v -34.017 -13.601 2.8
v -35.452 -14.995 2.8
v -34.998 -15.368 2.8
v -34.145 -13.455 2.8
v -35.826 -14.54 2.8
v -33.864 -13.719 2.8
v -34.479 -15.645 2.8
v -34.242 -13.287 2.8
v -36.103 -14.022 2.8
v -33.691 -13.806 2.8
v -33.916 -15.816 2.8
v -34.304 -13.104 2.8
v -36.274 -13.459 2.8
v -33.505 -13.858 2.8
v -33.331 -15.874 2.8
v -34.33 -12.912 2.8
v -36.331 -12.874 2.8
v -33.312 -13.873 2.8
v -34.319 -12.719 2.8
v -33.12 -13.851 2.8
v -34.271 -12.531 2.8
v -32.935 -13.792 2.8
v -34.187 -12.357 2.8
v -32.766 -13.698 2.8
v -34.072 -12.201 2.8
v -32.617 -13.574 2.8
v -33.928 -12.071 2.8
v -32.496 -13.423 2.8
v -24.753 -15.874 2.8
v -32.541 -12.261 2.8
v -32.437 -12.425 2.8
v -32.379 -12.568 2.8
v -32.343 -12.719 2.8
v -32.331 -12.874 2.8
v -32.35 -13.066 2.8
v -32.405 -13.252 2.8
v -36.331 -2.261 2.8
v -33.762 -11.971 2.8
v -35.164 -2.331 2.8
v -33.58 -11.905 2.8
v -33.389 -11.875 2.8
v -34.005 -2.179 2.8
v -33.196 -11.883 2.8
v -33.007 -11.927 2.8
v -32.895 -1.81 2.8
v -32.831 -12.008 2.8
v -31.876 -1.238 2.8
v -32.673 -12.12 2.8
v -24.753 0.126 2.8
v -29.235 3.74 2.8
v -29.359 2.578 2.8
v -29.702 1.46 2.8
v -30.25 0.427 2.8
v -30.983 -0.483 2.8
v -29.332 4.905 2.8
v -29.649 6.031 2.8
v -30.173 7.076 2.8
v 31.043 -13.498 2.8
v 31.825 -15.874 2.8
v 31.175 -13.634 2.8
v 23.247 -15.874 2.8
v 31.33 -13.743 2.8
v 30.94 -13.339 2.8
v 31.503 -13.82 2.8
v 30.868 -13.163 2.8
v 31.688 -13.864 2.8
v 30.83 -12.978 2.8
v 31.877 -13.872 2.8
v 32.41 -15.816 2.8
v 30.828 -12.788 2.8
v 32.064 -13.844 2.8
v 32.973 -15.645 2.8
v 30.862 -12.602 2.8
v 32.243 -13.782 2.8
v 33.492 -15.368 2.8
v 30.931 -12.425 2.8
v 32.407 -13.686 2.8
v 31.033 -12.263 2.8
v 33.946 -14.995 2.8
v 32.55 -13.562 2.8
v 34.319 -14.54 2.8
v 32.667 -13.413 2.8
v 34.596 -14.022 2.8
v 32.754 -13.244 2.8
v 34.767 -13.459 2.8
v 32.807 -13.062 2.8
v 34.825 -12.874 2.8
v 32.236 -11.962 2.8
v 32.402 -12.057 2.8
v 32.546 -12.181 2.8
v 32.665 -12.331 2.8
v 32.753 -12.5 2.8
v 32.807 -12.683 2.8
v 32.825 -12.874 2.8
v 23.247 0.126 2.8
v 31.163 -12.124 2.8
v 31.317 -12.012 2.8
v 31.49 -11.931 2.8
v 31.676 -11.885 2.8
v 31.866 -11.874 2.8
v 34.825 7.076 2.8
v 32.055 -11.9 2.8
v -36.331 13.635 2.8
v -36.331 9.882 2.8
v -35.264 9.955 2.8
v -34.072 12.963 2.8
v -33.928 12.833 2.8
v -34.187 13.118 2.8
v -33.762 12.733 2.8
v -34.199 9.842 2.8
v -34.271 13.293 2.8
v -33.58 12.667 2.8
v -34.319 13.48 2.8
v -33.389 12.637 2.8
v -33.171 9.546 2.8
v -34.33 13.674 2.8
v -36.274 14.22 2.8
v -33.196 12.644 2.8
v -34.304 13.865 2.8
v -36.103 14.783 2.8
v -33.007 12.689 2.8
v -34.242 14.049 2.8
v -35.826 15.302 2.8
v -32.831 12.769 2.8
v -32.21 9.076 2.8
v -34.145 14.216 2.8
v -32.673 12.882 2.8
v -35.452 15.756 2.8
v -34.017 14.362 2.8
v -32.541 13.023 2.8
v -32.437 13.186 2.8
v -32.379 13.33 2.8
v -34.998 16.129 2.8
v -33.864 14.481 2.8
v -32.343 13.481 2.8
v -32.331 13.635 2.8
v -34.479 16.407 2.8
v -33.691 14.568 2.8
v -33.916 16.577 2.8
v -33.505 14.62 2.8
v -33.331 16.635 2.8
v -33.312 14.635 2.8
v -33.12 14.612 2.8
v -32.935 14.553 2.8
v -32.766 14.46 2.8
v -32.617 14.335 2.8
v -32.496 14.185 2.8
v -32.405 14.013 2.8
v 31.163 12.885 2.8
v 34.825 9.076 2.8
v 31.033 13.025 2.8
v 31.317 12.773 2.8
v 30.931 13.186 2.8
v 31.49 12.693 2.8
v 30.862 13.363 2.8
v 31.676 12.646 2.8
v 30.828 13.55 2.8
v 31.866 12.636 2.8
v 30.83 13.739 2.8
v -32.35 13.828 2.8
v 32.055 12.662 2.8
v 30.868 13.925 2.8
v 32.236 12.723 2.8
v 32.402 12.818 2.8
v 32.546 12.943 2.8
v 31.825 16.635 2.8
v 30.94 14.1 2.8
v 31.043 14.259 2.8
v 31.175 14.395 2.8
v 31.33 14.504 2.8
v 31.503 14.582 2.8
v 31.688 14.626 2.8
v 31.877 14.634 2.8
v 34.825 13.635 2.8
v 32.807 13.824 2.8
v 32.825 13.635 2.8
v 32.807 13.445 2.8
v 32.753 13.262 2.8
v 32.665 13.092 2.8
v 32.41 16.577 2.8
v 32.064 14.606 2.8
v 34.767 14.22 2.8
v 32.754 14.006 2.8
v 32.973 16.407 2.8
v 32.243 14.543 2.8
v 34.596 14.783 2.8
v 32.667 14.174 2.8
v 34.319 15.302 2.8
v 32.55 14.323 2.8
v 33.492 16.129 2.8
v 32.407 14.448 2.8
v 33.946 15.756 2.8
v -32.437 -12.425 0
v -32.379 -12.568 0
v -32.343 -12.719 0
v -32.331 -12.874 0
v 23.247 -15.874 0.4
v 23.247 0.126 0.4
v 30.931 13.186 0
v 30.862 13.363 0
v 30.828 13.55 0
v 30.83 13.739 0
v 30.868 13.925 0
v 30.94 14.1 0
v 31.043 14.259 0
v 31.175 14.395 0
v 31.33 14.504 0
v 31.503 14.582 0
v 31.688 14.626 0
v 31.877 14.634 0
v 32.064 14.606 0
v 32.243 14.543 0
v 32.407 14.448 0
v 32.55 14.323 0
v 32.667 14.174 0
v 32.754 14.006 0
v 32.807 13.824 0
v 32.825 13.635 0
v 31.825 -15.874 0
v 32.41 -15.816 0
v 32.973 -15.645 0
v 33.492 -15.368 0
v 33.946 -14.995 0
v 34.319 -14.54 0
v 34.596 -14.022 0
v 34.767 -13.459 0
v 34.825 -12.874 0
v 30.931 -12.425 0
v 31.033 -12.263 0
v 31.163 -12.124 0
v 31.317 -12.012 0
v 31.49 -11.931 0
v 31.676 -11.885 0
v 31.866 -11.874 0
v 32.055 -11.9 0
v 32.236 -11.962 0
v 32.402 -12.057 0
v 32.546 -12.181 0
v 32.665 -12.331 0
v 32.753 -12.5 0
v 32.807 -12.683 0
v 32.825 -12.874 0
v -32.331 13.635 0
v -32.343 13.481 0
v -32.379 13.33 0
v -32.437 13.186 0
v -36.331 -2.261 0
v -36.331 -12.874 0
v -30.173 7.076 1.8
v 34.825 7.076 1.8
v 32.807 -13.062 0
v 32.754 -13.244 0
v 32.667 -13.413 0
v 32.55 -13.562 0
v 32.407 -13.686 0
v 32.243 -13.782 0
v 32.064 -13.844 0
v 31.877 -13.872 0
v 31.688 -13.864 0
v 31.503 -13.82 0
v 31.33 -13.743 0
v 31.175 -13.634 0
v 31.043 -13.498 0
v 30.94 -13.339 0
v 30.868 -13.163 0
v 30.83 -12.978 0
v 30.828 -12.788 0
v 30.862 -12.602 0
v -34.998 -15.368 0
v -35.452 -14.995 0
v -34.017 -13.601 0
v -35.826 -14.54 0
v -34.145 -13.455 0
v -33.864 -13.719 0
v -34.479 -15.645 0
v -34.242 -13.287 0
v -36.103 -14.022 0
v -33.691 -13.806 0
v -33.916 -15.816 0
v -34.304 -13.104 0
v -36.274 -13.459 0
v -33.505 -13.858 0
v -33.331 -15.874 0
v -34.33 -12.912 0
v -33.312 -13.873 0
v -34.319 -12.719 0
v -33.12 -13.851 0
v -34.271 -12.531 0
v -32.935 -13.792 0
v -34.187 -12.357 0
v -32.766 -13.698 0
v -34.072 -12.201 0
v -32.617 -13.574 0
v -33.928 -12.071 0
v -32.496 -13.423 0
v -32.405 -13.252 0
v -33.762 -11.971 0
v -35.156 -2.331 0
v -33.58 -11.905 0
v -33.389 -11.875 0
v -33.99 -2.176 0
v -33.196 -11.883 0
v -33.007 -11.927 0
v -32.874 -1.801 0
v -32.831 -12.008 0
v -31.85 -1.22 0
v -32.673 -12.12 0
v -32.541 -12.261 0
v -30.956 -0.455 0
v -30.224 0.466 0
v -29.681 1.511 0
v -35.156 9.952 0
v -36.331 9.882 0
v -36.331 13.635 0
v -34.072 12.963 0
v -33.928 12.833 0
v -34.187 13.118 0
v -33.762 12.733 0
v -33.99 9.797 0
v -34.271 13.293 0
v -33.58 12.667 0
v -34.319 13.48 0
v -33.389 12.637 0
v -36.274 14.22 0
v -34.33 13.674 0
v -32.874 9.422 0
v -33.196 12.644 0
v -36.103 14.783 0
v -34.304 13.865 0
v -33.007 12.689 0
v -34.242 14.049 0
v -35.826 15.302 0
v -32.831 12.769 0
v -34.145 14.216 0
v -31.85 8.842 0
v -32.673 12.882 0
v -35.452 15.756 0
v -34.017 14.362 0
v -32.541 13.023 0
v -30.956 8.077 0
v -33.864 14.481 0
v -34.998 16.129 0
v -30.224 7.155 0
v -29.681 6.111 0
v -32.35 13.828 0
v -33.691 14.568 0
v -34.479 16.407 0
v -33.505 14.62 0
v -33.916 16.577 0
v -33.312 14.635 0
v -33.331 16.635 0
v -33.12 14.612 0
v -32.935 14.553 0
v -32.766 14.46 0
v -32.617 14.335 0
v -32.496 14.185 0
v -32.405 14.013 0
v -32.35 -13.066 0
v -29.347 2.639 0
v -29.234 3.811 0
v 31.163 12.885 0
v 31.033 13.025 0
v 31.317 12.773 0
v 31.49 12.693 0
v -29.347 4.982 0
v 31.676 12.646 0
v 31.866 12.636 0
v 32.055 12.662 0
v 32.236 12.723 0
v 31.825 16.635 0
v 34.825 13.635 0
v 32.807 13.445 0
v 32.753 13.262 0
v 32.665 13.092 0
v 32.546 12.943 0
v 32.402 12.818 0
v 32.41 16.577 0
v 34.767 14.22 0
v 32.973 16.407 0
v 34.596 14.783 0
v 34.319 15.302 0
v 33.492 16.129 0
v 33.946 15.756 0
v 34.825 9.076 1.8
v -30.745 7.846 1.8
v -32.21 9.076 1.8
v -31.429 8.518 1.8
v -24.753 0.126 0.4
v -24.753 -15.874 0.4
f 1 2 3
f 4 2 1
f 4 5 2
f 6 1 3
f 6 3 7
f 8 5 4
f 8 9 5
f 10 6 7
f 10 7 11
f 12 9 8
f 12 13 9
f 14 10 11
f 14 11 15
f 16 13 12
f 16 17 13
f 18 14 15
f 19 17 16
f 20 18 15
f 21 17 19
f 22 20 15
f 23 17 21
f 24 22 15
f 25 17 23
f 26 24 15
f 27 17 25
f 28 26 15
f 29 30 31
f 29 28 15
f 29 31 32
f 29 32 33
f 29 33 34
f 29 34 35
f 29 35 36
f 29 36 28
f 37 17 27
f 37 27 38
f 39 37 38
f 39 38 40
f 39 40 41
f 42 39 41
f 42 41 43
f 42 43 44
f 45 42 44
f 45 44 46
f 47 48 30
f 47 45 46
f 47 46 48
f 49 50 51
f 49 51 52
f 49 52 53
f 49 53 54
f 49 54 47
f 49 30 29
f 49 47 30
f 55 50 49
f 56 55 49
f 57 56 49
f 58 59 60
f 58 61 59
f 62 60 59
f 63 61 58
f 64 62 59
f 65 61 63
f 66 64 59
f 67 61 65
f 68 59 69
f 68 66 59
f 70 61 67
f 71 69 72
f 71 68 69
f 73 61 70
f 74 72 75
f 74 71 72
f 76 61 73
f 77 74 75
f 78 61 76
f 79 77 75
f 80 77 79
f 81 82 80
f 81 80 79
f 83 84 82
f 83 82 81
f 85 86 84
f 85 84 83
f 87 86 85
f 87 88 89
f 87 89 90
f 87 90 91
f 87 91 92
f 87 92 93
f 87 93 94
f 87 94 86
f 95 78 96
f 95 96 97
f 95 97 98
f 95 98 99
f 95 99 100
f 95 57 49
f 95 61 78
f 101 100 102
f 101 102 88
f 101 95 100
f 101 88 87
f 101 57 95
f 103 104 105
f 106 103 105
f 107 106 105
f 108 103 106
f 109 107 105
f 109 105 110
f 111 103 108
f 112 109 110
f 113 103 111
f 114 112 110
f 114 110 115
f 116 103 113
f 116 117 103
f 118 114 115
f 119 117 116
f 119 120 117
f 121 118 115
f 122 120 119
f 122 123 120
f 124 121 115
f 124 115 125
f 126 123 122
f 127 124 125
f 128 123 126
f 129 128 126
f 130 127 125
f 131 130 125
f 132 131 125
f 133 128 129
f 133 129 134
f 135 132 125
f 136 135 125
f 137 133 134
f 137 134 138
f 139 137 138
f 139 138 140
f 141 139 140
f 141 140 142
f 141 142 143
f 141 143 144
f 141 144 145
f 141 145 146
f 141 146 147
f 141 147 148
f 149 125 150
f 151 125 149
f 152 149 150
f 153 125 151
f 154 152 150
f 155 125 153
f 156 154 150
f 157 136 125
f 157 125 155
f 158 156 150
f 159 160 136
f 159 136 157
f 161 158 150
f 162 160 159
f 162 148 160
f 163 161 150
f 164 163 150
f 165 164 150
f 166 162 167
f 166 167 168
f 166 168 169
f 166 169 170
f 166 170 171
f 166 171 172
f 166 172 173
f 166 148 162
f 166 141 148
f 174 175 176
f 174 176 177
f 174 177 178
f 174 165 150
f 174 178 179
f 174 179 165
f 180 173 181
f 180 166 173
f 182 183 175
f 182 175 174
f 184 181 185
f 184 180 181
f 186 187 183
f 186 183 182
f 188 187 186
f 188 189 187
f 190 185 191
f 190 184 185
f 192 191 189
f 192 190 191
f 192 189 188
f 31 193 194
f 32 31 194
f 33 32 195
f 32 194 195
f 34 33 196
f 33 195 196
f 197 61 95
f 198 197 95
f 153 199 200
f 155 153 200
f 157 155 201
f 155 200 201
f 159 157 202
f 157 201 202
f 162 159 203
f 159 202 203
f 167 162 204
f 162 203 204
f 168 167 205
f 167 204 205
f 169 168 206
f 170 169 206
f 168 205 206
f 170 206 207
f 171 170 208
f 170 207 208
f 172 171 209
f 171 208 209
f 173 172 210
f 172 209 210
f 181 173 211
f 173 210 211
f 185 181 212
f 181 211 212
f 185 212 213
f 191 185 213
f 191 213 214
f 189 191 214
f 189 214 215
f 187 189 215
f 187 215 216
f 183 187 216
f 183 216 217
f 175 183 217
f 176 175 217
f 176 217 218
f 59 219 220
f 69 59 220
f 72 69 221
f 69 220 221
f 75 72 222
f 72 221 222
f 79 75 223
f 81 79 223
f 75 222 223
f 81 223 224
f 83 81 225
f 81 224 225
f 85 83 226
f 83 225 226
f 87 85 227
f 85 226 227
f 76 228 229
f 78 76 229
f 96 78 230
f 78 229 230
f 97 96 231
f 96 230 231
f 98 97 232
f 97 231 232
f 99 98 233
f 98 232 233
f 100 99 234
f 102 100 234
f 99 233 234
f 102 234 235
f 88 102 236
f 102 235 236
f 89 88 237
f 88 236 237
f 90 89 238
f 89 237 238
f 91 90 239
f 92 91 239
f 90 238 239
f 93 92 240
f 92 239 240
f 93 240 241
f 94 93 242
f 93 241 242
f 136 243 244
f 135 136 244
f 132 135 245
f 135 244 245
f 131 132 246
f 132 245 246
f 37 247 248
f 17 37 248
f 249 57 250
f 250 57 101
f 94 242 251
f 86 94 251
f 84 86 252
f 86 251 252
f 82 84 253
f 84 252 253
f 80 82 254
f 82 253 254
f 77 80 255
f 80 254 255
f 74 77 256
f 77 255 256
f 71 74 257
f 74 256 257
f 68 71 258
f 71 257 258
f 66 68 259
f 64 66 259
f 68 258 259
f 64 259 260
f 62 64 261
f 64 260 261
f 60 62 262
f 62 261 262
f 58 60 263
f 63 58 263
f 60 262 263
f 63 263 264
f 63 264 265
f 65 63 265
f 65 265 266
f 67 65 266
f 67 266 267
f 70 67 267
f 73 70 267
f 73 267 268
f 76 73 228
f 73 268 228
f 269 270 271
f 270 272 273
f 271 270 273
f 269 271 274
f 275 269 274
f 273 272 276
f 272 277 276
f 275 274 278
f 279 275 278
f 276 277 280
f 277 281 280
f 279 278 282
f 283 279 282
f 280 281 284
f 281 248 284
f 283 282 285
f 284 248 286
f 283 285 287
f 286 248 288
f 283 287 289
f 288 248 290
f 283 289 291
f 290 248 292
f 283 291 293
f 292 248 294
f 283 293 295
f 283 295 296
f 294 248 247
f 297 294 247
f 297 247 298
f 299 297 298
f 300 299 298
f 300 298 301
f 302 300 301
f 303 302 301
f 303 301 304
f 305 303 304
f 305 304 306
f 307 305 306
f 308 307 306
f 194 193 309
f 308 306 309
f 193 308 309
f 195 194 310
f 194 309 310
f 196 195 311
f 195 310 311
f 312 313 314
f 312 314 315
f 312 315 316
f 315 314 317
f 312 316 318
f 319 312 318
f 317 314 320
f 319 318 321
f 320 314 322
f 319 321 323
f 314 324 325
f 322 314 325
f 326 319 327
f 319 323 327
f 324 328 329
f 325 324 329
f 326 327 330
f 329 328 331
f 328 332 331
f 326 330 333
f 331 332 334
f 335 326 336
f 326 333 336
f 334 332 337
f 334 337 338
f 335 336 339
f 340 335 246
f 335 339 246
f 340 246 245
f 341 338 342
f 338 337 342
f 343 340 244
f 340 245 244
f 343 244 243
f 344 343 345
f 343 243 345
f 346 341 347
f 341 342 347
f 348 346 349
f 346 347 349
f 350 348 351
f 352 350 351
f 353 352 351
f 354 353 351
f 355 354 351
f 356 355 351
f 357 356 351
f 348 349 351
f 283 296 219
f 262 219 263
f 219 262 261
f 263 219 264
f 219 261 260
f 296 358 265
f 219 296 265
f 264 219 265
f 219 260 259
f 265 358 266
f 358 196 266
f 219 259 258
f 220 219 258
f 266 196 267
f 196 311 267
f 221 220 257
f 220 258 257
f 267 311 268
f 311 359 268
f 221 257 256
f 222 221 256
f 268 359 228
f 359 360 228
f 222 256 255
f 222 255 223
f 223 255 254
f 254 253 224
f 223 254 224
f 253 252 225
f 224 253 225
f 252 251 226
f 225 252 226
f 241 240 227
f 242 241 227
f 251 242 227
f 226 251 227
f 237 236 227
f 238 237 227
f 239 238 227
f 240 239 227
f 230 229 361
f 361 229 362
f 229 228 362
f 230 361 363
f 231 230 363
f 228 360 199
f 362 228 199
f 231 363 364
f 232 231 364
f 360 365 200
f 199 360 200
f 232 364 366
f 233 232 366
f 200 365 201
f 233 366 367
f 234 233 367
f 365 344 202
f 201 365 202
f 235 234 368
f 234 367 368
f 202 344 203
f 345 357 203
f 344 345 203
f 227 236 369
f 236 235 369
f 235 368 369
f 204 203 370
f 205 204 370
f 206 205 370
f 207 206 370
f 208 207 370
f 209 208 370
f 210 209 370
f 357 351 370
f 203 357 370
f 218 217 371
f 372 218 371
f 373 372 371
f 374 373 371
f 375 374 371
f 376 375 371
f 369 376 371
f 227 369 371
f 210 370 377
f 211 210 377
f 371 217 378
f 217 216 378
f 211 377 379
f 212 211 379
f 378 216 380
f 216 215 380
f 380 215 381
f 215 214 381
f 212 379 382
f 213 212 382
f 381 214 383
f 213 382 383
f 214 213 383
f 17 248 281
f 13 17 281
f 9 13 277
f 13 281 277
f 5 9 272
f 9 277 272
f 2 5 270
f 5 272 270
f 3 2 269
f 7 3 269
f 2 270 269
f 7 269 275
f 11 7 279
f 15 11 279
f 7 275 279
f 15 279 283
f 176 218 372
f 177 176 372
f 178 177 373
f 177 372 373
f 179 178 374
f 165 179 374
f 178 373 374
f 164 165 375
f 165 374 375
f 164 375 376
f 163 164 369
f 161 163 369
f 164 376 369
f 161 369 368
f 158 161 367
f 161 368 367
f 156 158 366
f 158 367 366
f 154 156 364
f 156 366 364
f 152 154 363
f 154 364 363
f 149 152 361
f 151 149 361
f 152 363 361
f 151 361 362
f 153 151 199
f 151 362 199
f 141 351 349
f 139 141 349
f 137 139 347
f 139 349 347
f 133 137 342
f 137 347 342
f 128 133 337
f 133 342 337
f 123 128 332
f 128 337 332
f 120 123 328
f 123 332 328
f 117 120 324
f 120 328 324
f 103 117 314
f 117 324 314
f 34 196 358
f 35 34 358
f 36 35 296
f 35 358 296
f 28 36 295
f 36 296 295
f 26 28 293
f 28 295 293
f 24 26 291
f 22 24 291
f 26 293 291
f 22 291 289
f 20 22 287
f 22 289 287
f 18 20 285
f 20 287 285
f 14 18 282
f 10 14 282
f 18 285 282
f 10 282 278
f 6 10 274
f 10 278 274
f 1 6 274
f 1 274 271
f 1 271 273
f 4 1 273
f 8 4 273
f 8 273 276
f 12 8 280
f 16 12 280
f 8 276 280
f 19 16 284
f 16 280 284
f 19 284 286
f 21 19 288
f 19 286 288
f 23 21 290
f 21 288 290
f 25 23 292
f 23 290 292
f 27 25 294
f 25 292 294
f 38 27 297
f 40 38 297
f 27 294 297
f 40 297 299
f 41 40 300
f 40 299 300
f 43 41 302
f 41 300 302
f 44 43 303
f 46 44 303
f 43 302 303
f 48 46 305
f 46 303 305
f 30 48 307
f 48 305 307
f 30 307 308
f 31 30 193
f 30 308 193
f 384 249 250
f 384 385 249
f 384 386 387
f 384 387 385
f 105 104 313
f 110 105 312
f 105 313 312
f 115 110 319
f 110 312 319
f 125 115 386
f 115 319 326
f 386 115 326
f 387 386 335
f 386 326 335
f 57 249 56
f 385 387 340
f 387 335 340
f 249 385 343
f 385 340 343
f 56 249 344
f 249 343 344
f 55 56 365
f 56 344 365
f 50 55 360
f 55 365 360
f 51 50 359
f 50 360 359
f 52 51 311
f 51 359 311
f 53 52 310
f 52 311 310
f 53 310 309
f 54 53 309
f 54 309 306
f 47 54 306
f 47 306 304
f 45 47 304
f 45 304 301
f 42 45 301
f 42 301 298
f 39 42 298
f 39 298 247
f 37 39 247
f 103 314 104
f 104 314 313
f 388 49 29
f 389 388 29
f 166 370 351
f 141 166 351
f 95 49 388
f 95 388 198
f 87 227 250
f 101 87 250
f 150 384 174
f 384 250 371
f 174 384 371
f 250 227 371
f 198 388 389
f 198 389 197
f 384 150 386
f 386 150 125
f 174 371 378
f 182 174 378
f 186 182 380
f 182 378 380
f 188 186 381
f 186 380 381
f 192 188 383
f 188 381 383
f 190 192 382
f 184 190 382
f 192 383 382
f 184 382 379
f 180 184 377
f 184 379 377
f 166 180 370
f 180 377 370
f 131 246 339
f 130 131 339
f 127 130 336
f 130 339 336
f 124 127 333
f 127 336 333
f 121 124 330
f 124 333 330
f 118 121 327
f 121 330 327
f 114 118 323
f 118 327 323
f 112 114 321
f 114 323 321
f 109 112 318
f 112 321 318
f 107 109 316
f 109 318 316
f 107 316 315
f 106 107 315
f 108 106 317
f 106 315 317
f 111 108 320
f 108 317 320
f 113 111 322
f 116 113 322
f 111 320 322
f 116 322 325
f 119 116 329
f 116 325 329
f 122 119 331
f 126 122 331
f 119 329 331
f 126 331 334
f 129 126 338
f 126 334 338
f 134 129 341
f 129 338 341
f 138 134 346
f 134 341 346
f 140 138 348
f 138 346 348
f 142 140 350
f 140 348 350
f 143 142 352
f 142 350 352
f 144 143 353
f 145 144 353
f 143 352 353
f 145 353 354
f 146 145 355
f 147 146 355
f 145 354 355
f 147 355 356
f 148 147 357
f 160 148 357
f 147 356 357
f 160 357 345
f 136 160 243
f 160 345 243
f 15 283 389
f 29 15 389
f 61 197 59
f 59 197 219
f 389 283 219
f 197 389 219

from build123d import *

# Parameters (mm, degrees)
F1_DEPTH = 2.8
F2_W     = 48
F2_H     = 2
F2_H_2   = 16
F3_DEPTH = 2.4
F4_DEPTH = 1


with BuildPart() as f1:
    # F0 (on Top) → F1 (new body)
    with BuildSketch(Plane.XY):
        with BuildLine():
            ThreePointArc((34.8248369992, 13.6349746287), (33.9461573427, 15.7562949722), (31.8248369992, 16.6349746287))
            Line((31.8248369992, 16.6349746287), (-33.3311557472, 16.6349746287))
            ThreePointArc((-33.3311557472, 16.6349746287), (-35.4524760907, 15.7562949722), (-36.3311557472, 13.6349746287))
            Line((-36.3311557472, 13.6349746287), (-36.3311557472, 9.882260114))
            ThreePointArc((-36.3311557472, 9.882260114), (-29.2342316353, 3.8106893189), (-36.3311557472, -2.2608814761))
            Line((-36.3311557472, -2.2608814761), (-36.3311557472, -12.8735043705))
            ThreePointArc((-36.3311557472, -12.8735043705), (-35.4524760907, -14.994824714), (-33.3311557472, -15.8735043705))
            Line((-33.3311557472, -15.8735043705), (31.8248369992, -15.8735043705))
            ThreePointArc((31.8248369992, -15.8735043705), (33.9461573427, -14.994824714), (34.8248369992, -12.8735043705))
            Line((34.8248369992, -12.8735043705), (34.8248369992, 13.6349746287))
        make_face()
        with BuildLine():
            ThreePointArc((-32.3311557472, -12.8735043705), (-34.3042365532, -13.1039685651), (-32.4373832372, -12.4249838019))
            ThreePointArc((-32.4373832372, -12.4249838019), (-32.3580749412, -12.6430401758), (-32.3311557472, -12.8735043705))
        make_face(mode=Mode.SUBTRACT)
        with BuildLine():
            ThreePointArc((32.8248369992, -12.8735043705), (31.5943728046, -13.8465851764), (30.9310644892, -12.4249838019))
            ThreePointArc((30.9310644892, -12.4249838019), (32.0553011938, -11.9004235645), (32.8248369992, -12.8735043705))
        make_face(mode=Mode.SUBTRACT)
        with BuildLine():
            ThreePointArc((-32.3311557472, 13.6349746287), (-32.3580749412, 13.4045104341), (-32.4373832372, 13.1864540602))
            ThreePointArc((-32.4373832372, 13.1864540602), (-34.3042365532, 13.8654388233), (-32.3311557472, 13.6349746287))
        make_face(mode=Mode.SUBTRACT)
        with BuildLine():
            ThreePointArc((32.8248369992, 13.6349746287), (32.0553011938, 12.6618938227), (30.9310644892, 13.1864540602))
            ThreePointArc((30.9310644892, 13.1864540602), (31.5943728046, 14.6080554347), (32.8248369992, 13.6349746287))
        make_face(mode=Mode.SUBTRACT)
    extrude(amount=F1_DEPTH)

    # F2 (on face) → F3 (cut)
    with BuildSketch(Plane.XY.offset(2.8)):
        with Locations((-0.753159374, -16.8735043705)):
            Rectangle(F2_W, F2_H)
        with Locations((-0.753159374, -7.8735043705)):
            Rectangle(F2_W, F2_H_2)
    extrude(amount=-F3_DEPTH, mode=Mode.SUBTRACT)

    # F2 (on face) → F4 (cut)
    with BuildSketch(Plane.XY.offset(2.8)):
        with BuildLine():
            Line((-30.1732155819, 7.075597696), (34.8248369992, 7.075597696))
            Line((34.8248369992, 7.075597696), (34.8248369992, 9.075597696))
            Line((34.8248369992, 9.075597696), (-32.2097548914, 9.075597696))
            ThreePointArc((-32.2097548914, 9.075597696), (-31.0737619928, 8.1954717029), (-30.1732155819, 7.075597696))
        make_face()
    extrude(amount=-F4_DEPTH, mode=Mode.SUBTRACT)


solid = f1.part
